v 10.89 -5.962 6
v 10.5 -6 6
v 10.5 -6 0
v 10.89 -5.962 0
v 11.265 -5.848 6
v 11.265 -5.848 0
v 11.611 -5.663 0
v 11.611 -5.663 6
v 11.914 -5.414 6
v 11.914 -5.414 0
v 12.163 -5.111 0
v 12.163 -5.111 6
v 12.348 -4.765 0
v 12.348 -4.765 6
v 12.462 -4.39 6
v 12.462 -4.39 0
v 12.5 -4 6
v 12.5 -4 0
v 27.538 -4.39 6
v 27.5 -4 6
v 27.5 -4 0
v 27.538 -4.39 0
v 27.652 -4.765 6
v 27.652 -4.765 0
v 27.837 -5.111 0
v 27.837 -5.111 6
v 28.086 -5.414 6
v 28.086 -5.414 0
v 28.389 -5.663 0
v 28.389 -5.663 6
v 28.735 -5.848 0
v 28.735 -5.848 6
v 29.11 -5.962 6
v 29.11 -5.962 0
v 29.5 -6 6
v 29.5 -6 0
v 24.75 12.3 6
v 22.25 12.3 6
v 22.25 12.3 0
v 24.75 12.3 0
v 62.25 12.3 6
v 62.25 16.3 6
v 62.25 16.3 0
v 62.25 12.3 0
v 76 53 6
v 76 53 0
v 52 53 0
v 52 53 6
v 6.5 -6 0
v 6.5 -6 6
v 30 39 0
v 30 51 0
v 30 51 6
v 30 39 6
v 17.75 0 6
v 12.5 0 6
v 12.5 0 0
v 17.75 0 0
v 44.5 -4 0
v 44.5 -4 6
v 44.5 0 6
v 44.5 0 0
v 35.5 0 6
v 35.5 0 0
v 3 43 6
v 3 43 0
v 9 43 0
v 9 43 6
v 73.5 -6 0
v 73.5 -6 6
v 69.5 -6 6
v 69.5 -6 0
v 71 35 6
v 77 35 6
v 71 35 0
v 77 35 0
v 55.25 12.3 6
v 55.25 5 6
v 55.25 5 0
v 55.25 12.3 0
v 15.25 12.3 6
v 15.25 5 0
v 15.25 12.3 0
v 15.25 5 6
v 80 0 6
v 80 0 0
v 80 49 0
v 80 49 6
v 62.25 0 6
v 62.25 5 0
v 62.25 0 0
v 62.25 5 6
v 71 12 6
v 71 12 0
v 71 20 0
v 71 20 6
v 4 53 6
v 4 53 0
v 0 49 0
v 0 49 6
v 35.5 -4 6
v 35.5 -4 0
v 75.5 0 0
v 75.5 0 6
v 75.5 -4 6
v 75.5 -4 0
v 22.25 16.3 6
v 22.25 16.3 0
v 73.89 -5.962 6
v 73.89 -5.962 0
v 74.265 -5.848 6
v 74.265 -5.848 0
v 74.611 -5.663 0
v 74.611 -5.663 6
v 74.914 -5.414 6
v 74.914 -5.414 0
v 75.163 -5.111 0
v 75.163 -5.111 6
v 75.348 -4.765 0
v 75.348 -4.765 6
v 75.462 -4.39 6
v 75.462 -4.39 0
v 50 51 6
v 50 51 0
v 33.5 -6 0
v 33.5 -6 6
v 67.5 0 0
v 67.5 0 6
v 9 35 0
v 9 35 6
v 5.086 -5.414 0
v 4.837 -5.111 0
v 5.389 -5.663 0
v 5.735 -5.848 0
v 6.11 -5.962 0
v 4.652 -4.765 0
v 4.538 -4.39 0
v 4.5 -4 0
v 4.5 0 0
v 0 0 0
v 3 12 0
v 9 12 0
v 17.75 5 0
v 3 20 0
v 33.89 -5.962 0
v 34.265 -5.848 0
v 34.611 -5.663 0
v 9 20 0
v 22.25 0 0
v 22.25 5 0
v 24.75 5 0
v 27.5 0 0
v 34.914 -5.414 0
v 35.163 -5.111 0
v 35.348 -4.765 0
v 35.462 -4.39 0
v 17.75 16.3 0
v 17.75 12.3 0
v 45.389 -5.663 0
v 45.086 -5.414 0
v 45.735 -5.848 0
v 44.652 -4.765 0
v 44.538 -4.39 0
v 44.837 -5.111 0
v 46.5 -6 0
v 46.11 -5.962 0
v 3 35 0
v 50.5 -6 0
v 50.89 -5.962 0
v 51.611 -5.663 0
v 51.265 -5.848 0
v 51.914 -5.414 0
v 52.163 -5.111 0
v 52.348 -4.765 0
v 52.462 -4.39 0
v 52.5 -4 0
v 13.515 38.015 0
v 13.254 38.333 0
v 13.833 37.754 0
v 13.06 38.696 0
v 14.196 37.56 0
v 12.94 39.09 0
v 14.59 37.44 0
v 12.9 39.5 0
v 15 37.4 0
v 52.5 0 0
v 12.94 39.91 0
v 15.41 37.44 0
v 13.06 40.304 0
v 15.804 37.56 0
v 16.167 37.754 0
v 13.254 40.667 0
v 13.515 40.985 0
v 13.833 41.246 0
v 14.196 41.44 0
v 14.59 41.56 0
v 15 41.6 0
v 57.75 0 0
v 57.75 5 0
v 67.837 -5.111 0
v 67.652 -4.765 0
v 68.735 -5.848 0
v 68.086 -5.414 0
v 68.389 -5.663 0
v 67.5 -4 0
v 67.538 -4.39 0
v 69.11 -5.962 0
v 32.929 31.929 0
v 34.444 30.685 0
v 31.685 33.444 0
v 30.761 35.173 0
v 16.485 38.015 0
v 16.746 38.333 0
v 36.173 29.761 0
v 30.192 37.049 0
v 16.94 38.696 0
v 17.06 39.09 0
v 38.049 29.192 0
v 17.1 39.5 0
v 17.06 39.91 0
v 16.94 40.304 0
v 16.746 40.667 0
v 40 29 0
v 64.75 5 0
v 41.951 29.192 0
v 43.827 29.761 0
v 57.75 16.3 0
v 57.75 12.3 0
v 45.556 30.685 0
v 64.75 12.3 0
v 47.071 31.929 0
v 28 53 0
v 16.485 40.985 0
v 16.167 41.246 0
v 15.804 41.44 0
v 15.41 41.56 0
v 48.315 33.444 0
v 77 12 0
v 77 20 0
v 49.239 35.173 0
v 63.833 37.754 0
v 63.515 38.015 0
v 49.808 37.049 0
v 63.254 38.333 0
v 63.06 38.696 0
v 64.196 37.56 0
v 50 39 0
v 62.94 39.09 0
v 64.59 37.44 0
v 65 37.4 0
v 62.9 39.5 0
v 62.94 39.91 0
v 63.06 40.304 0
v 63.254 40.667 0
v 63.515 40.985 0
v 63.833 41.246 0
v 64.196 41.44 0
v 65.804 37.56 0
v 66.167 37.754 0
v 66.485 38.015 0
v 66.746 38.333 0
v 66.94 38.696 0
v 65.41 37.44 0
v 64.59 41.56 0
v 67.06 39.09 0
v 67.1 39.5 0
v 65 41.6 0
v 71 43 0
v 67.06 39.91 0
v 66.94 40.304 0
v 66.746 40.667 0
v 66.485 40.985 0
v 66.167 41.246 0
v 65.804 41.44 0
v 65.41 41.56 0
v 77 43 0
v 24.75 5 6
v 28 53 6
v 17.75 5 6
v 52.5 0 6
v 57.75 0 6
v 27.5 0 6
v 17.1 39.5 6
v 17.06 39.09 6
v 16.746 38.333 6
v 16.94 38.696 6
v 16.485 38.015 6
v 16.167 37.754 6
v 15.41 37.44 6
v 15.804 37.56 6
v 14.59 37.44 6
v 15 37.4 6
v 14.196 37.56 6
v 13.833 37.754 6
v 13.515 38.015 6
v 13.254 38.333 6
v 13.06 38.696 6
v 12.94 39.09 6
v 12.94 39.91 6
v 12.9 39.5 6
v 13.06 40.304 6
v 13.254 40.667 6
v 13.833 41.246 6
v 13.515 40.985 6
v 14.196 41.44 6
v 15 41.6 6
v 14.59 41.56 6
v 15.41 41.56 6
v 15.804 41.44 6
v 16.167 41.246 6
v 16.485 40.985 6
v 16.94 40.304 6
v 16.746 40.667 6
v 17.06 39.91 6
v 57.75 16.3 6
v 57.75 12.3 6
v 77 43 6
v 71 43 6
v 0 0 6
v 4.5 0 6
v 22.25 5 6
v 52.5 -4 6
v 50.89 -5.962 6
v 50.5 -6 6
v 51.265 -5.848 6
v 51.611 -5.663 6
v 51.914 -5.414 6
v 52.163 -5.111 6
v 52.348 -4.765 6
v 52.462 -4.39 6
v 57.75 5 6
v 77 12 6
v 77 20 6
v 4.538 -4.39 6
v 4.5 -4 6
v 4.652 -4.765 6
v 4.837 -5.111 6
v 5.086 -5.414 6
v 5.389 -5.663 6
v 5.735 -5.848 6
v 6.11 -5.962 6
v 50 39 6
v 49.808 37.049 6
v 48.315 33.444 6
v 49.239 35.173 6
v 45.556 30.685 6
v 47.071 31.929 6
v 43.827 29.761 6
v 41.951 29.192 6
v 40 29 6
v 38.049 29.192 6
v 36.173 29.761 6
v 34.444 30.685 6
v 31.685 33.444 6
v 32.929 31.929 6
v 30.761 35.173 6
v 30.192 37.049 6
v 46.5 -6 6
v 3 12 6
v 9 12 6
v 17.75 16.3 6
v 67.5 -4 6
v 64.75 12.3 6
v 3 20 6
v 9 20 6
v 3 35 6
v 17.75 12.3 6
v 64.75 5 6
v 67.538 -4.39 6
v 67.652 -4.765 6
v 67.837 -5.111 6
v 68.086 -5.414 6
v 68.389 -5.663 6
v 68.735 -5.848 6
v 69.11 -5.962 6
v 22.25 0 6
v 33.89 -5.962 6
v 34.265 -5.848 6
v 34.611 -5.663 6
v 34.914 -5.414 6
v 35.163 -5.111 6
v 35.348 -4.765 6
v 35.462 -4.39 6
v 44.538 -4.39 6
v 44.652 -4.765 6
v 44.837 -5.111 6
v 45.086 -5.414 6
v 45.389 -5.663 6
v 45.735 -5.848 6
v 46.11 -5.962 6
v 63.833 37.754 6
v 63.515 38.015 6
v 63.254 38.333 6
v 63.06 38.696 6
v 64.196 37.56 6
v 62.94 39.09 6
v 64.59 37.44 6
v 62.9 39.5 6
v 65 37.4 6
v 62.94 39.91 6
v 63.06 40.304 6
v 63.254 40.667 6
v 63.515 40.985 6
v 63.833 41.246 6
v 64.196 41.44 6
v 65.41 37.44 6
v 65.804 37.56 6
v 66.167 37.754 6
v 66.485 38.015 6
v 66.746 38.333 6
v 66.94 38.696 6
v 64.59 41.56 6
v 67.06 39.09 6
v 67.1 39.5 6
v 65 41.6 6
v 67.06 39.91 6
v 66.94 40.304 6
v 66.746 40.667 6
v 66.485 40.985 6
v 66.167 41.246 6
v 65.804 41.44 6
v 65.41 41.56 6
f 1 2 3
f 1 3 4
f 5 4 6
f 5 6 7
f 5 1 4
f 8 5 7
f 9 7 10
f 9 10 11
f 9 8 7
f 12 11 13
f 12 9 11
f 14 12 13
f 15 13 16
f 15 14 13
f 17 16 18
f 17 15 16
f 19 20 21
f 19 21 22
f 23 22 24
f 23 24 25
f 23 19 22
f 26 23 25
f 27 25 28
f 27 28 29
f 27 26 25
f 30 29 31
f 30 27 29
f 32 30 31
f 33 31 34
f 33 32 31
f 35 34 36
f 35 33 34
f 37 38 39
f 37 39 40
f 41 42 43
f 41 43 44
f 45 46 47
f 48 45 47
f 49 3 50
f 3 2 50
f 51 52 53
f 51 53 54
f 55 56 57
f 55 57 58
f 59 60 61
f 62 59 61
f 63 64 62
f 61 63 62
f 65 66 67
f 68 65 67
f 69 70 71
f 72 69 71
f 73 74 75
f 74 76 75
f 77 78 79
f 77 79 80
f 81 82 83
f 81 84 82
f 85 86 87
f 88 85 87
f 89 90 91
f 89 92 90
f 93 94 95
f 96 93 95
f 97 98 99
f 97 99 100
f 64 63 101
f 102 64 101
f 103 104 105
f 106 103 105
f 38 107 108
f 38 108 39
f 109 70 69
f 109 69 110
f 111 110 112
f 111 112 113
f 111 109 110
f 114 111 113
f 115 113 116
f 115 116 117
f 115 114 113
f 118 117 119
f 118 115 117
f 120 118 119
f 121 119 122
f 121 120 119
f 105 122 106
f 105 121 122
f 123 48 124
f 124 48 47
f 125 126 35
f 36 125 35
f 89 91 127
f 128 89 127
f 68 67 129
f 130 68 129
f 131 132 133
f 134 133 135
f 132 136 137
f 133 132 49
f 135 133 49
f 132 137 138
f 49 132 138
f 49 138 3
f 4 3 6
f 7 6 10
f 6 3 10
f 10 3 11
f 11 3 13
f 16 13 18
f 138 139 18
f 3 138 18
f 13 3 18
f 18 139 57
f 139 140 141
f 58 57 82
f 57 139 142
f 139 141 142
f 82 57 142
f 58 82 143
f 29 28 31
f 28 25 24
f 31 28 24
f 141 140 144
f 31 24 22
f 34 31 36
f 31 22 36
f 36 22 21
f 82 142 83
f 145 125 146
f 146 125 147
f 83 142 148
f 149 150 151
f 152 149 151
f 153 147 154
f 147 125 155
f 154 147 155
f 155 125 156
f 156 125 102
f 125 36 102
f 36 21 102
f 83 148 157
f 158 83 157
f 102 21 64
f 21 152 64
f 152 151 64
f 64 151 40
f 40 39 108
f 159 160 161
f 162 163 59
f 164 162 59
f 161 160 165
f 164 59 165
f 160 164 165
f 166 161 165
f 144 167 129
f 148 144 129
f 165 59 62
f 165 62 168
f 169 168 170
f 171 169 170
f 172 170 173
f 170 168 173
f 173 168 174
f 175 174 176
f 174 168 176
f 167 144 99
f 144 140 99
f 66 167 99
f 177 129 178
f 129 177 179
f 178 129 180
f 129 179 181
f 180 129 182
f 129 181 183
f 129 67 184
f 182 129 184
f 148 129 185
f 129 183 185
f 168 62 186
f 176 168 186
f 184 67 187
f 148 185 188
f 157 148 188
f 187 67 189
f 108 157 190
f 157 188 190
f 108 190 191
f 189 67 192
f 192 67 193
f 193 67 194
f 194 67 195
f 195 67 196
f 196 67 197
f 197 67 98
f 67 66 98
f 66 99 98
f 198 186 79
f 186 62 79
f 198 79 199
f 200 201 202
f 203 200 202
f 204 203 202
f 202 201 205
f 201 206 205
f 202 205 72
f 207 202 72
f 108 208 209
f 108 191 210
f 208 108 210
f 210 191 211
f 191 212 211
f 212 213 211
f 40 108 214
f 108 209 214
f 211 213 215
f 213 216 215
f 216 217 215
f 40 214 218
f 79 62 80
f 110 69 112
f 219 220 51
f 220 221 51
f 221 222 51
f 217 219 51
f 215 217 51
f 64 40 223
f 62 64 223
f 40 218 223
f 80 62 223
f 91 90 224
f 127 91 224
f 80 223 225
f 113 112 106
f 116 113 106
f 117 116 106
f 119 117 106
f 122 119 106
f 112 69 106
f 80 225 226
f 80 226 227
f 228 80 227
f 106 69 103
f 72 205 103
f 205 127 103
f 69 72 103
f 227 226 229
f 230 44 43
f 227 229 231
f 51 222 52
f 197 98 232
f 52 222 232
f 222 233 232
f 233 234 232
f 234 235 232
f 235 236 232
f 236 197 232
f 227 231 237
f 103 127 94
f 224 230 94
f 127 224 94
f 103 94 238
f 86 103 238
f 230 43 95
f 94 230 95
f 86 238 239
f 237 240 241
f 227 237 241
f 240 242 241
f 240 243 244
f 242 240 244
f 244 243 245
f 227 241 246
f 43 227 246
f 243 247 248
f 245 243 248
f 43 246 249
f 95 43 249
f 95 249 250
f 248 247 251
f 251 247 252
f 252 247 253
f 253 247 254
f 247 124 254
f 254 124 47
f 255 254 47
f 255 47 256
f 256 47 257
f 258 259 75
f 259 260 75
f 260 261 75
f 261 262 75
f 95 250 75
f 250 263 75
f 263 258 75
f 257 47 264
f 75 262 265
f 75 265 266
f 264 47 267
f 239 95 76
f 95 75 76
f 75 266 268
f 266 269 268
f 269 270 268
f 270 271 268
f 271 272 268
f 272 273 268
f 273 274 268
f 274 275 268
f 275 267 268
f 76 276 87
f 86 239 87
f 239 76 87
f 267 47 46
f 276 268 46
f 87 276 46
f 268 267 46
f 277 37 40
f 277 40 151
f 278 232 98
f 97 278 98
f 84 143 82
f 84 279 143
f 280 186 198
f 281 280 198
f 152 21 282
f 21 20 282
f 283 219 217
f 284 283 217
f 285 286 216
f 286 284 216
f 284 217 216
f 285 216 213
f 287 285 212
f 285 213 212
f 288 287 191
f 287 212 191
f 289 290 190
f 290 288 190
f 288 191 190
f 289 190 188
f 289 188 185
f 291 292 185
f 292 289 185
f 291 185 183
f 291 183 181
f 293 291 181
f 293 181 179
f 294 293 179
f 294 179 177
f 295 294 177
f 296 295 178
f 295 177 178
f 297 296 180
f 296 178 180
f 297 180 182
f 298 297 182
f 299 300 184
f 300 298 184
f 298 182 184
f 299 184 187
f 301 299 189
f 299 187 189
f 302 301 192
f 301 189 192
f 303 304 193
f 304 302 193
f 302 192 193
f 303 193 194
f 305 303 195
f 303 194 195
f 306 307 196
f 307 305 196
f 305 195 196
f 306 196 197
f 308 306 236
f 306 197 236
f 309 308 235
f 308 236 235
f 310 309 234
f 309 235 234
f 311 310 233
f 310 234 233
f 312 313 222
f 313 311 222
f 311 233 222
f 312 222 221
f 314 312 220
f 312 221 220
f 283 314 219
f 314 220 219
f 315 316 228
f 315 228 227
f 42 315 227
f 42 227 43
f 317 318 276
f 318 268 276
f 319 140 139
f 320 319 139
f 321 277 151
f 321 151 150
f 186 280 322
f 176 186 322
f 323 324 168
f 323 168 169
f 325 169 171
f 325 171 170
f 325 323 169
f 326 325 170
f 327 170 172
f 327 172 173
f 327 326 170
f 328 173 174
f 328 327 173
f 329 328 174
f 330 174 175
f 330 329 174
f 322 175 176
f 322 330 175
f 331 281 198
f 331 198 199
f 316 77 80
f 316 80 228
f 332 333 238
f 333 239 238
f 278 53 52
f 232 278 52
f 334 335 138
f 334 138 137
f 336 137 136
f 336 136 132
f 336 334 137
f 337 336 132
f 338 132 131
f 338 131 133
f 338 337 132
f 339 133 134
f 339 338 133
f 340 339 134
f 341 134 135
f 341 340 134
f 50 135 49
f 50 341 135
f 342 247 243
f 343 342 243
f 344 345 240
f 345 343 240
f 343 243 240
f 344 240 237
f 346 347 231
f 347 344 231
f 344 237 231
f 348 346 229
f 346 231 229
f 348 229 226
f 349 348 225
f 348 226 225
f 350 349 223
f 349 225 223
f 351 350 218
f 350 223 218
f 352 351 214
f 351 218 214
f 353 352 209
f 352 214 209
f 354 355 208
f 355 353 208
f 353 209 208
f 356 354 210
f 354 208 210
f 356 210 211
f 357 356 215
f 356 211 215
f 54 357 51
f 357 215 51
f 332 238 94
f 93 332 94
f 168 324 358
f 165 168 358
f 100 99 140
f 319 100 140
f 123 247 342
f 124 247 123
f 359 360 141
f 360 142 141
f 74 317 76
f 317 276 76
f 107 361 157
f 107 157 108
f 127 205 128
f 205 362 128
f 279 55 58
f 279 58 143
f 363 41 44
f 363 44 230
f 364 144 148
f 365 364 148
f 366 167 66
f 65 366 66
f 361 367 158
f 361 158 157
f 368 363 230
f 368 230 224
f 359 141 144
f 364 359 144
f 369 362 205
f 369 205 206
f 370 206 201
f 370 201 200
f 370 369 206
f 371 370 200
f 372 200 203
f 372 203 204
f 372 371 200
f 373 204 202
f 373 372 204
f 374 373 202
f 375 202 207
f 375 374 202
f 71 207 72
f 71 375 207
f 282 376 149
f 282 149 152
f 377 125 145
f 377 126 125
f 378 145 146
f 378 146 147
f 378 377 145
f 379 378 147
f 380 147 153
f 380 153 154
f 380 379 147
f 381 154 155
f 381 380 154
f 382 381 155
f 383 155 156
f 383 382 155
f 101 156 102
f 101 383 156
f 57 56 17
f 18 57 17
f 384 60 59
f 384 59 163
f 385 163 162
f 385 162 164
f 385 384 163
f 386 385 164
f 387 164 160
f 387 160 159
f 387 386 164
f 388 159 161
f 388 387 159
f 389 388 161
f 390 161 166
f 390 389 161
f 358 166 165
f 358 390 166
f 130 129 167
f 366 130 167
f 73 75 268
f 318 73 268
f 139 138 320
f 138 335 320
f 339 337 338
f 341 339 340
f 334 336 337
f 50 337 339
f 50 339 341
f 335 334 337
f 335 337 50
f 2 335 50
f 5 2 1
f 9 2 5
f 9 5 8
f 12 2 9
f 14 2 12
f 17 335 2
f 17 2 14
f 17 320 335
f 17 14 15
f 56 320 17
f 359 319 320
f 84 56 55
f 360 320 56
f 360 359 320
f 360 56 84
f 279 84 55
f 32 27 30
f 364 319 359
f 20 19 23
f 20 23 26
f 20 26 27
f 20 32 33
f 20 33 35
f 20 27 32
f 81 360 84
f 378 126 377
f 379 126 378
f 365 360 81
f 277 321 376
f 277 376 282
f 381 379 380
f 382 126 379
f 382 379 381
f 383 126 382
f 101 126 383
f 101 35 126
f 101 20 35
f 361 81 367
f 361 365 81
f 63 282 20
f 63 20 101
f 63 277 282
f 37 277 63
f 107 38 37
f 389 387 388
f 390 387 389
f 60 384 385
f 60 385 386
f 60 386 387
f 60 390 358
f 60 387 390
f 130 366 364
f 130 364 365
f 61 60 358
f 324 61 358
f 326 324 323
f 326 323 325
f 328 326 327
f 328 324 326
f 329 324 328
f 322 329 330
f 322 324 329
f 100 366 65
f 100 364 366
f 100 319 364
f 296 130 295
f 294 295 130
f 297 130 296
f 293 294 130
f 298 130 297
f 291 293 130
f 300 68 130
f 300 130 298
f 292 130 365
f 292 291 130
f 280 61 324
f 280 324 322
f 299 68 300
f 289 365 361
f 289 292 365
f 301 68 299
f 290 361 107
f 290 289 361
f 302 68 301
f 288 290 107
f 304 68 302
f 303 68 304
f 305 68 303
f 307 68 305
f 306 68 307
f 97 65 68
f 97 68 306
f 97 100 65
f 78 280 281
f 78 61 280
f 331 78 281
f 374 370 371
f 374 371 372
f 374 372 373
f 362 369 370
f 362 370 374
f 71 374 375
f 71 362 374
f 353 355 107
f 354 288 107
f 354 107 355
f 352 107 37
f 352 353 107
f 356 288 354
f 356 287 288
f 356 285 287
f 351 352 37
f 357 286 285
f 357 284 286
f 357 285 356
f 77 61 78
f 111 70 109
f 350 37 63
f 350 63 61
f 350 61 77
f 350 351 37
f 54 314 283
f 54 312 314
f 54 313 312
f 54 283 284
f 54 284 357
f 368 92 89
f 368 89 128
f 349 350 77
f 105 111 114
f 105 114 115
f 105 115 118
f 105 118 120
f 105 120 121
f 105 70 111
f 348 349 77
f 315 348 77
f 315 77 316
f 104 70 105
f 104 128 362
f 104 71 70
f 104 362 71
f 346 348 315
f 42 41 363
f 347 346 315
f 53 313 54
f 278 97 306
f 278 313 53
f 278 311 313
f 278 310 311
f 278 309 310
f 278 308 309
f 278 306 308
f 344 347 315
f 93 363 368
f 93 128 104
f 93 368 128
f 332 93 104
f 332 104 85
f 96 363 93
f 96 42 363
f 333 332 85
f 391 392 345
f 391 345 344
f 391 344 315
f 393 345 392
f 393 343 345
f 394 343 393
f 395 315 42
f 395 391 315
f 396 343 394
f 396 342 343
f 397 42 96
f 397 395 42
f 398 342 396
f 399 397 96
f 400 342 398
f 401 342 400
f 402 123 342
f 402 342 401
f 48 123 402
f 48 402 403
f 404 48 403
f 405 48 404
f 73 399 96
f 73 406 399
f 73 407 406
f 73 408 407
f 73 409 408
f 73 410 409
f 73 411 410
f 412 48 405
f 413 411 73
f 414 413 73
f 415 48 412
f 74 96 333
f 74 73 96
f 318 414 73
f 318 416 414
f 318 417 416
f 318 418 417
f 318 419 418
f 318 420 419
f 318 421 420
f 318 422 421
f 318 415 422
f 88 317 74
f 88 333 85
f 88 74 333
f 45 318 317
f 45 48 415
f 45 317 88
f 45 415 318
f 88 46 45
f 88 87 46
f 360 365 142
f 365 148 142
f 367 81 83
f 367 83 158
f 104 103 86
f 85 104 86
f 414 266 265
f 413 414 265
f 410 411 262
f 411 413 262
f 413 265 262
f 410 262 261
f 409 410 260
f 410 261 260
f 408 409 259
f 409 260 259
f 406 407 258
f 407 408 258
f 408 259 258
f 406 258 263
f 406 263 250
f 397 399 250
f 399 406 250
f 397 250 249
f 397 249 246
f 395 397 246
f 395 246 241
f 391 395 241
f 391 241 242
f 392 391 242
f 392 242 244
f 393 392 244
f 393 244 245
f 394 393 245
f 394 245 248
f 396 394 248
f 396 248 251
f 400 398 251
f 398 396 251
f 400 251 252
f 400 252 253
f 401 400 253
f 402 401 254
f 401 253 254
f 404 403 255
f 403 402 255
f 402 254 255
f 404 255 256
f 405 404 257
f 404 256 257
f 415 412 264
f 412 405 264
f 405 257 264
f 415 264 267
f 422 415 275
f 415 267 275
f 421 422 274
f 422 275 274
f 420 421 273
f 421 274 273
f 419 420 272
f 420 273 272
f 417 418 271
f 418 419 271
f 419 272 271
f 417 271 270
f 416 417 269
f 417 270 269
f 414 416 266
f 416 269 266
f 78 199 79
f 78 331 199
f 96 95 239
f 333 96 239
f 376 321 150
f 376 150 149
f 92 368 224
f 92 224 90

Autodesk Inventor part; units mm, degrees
ref_plane "YZ Plane" through (0, 0, 0) normal (1, 0, 0) x (0, 1, 0)
ref_plane "XZ Plane" through (0, 0, 0) normal (0, 1, 0) x (-1, 0, 0)
ref_plane "XY Plane" through (0, 0, 0) normal (0, 0, 1) x (1, 0, 0)
sketch "Sketch1" plane through (0, 0, 0) normal (0, 0, 1) x (1, 0, 0)
  line L0 (0, 0) -> (80, 0)
  line L1 (80, 0) -> (80, 53)
  line L2 (0, 53) -> (0, 0)
  line L3 (30, 53) -> (30, 39)
  arc A0 (30, 39) -> (50, 39) centre (40, 39) ccw
  line L4 (50, 39) -> (50, 53)
  line L5 (80, 53) -> (50, 53)
  line L6 (30, 53) -> (0, 53)
  circle A1 centre (15, 39.5) radius 2.1
  circle A2 centre (65, 39.5) radius 2.1
  line L7 (3, 20) -> (9, 20)
  line L8 (9, 20) -> (9, 12)
  line L9 (9, 12) -> (3, 12)
  line L10 (3, 12) -> (3, 20)
  line L11 (71, 20) -> (77, 20)
  line L12 (77, 20) -> (77, 12)
  line L13 (77, 12) -> (71, 12)
  line L14 (71, 12) -> (71, 20)
  line L15 (71, 43) -> (77, 43)
  line L16 (77, 43) -> (77, 35)
  line L17 (77, 35) -> (71, 35)
  line L18 (71, 35) -> (71, 43)
  line L19 (3, 43) -> (9, 43)
  line L20 (9, 43) -> (9, 35)
  line L21 (9, 35) -> (3, 35)
  line L22 (3, 35) -> (3, 43)
  point P0 (40, 0)
  dimension "d0" = 80
  dimension "d1" = 53
  dimension "d2" = 20
  dimension "d3" = 14
  dimension "d4" = 13.5
  dimension "d5" = 4.2
  dimension "d6" = 4.2
  dimension "d9" = 8
  dimension "d10" = 6
  dimension "d11" = 8
  dimension "d12" = 15
  dimension "d13" = 3
  dimension "d14" = 12
  dimension "d15" = 8
  dimension "d16" = 8
  dimension "d17" = 6
  dimension "d18" = 3
  dimension "d19" = 50
  dimension "d20" = 15
extrude "Extrusion1" add sketch "Sketch1" along normal blind 6
sketch "Sketch2" plane through (0, 0, 6) normal (0, 0, 1) x (1, 0, 0)
  line L0 (0, 0) -> (80, 0) projected
  line L1 (17.75, 16.3) -> (22.25, 16.3)
  line L2 (22.25, 0) -> (17.75, 0)
  line L3 (24.75, 12.3) -> (24.75, 5)
  line L4 (15.25, 5) -> (15.25, 12.3)
  line L5 (57.75, 16.3) -> (62.25, 16.3)
  line L6 (62.25, 0) -> (57.75, 0)
  line L7 (64.75, 12.3) -> (64.75, 5)
  line L8 (55.25, 5) -> (55.25, 12.3)
  line L9 (22.25, 16.3) -> (22.25, 12.3)
  line L10 (22.25, 5) -> (22.25, 0)
  line L11 (17.75, 0) -> (17.75, 5)
  line L12 (17.75, 12.3) -> (17.75, 16.3)
  line L13 (15.25, 12.3) -> (17.75, 12.3)
  line L14 (22.25, 12.3) -> (24.75, 12.3)
  line L15 (24.75, 5) -> (22.25, 5)
  line L16 (17.75, 5) -> (15.25, 5)
  line L17 (55.25, 12.3) -> (57.75, 12.3)
  line L18 (62.25, 12.3) -> (64.75, 12.3)
  line L19 (64.75, 5) -> (62.25, 5)
  line L20 (57.75, 5) -> (55.25, 5)
  line L21 (62.25, 16.3) -> (62.25, 12.3)
  line L22 (62.25, 5) -> (62.25, 0)
  line L23 (57.75, 0) -> (57.75, 5)
  line L24 (57.75, 12.3) -> (57.75, 16.3)
  line L25 (24.75, 8.65) -> (55.25, 8.65) construction
  point P0 (20, 16.3)
  point P1 (60, 16.3)
  point P2 (40, 8.65)
  point P3 (40, 0)
  dimension "d23" = 4.5
  dimension "d24" = 5
  dimension "d25" = 7.3
  dimension "d26" = 4
  dimension "d27" = 2.5
  dimension "d28" = 2.5
  dimension "d29" = 4.5
  dimension "d30" = 5
  dimension "d31" = 4
  dimension "d32" = 7.3
  dimension "d33" = 2.5
  dimension "d34" = 2.5
  dimension "d35" = 40
extrude "Extrusion2" cut sketch "Sketch2" against normal through all
sketch "Sketch3" plane through (0, 0, 6) normal (0, 0, 1) x (1, 0, 0)
  line L0 (22.25, 0) -> (57.75, 0) projected
  line L1 (57.75, 16.3) -> (62.25, 16.3) projected
  line L2 (62.25, 0) -> (80, 0) projected
  line L3 (0, 0) -> (17.75, 0) projected
  line L4 (17.75, 16.3) -> (22.25, 16.3) projected
  line L5 (4.5, 0) -> (12.5, 0)
  line L6 (12.5, 0) -> (12.5, -4)
  line L7 (10.5, -6) -> (6.5, -6)
  line L8 (4.5, -4) -> (4.5, 0)
  line L9 (27.5, 0) -> (35.5, 0)
  line L10 (35.5, 0) -> (35.5, -4)
  line L11 (33.5, -6) -> (29.5, -6)
  line L12 (27.5, -4) -> (27.5, 0)
  line L13 (44.5, 0) -> (52.5, 0)
  line L14 (52.5, 0) -> (52.5, -4)
  line L15 (50.5, -6) -> (46.5, -6)
  line L16 (44.5, -4) -> (44.5, 0)
  line L17 (67.5, 0) -> (75.5, 0)
  line L18 (75.5, 0) -> (75.5, -4)
  line L19 (73.5, -6) -> (69.5, -6)
  line L20 (67.5, -4) -> (67.5, 0)
  arc A0 (4.5, -4) -> (6.5, -6) centre (6.5, -4) ccw
  arc A1 (10.5, -6) -> (12.5, -4) centre (10.5, -4) ccw
  arc A2 (27.5, -4) -> (29.5, -6) centre (29.5, -4) ccw
  arc A3 (33.5, -6) -> (35.5, -4) centre (33.5, -4) ccw
  arc A4 (44.5, -4) -> (46.5, -6) centre (46.5, -4) ccw
  arc A5 (50.5, -6) -> (52.5, -4) centre (50.5, -4) ccw
  arc A6 (67.5, -4) -> (69.5, -6) centre (69.5, -4) ccw
  arc A7 (73.5, -6) -> (75.5, -4) centre (73.5, -4) ccw
  point P0 (20, 16.3)
  point P1 (60, 16.3)
  dimension "d44" = 2
  dimension "d45" = 15
  dimension "d46" = 15
  dimension "d47" = 6
  dimension "d48" = 7.5
  dimension "d49" = 7.5
  dimension "d50" = 8
  dimension "d51" = 8
  dimension "d52" = 8
  dimension "d53" = 8
extrude "Extrusion3" add sketch "Sketch3" against normal blind 6
chamfer "Chamfer1" distance 4 angle 45 2 edges at (0, 53, 3) (80, 53, 3)
chamfer "Chamfer2" distance 2 angle 45 2 edges at (30, 53, 3) (50, 53, 3)
properties part number "x_carriage_extruder_mount"
